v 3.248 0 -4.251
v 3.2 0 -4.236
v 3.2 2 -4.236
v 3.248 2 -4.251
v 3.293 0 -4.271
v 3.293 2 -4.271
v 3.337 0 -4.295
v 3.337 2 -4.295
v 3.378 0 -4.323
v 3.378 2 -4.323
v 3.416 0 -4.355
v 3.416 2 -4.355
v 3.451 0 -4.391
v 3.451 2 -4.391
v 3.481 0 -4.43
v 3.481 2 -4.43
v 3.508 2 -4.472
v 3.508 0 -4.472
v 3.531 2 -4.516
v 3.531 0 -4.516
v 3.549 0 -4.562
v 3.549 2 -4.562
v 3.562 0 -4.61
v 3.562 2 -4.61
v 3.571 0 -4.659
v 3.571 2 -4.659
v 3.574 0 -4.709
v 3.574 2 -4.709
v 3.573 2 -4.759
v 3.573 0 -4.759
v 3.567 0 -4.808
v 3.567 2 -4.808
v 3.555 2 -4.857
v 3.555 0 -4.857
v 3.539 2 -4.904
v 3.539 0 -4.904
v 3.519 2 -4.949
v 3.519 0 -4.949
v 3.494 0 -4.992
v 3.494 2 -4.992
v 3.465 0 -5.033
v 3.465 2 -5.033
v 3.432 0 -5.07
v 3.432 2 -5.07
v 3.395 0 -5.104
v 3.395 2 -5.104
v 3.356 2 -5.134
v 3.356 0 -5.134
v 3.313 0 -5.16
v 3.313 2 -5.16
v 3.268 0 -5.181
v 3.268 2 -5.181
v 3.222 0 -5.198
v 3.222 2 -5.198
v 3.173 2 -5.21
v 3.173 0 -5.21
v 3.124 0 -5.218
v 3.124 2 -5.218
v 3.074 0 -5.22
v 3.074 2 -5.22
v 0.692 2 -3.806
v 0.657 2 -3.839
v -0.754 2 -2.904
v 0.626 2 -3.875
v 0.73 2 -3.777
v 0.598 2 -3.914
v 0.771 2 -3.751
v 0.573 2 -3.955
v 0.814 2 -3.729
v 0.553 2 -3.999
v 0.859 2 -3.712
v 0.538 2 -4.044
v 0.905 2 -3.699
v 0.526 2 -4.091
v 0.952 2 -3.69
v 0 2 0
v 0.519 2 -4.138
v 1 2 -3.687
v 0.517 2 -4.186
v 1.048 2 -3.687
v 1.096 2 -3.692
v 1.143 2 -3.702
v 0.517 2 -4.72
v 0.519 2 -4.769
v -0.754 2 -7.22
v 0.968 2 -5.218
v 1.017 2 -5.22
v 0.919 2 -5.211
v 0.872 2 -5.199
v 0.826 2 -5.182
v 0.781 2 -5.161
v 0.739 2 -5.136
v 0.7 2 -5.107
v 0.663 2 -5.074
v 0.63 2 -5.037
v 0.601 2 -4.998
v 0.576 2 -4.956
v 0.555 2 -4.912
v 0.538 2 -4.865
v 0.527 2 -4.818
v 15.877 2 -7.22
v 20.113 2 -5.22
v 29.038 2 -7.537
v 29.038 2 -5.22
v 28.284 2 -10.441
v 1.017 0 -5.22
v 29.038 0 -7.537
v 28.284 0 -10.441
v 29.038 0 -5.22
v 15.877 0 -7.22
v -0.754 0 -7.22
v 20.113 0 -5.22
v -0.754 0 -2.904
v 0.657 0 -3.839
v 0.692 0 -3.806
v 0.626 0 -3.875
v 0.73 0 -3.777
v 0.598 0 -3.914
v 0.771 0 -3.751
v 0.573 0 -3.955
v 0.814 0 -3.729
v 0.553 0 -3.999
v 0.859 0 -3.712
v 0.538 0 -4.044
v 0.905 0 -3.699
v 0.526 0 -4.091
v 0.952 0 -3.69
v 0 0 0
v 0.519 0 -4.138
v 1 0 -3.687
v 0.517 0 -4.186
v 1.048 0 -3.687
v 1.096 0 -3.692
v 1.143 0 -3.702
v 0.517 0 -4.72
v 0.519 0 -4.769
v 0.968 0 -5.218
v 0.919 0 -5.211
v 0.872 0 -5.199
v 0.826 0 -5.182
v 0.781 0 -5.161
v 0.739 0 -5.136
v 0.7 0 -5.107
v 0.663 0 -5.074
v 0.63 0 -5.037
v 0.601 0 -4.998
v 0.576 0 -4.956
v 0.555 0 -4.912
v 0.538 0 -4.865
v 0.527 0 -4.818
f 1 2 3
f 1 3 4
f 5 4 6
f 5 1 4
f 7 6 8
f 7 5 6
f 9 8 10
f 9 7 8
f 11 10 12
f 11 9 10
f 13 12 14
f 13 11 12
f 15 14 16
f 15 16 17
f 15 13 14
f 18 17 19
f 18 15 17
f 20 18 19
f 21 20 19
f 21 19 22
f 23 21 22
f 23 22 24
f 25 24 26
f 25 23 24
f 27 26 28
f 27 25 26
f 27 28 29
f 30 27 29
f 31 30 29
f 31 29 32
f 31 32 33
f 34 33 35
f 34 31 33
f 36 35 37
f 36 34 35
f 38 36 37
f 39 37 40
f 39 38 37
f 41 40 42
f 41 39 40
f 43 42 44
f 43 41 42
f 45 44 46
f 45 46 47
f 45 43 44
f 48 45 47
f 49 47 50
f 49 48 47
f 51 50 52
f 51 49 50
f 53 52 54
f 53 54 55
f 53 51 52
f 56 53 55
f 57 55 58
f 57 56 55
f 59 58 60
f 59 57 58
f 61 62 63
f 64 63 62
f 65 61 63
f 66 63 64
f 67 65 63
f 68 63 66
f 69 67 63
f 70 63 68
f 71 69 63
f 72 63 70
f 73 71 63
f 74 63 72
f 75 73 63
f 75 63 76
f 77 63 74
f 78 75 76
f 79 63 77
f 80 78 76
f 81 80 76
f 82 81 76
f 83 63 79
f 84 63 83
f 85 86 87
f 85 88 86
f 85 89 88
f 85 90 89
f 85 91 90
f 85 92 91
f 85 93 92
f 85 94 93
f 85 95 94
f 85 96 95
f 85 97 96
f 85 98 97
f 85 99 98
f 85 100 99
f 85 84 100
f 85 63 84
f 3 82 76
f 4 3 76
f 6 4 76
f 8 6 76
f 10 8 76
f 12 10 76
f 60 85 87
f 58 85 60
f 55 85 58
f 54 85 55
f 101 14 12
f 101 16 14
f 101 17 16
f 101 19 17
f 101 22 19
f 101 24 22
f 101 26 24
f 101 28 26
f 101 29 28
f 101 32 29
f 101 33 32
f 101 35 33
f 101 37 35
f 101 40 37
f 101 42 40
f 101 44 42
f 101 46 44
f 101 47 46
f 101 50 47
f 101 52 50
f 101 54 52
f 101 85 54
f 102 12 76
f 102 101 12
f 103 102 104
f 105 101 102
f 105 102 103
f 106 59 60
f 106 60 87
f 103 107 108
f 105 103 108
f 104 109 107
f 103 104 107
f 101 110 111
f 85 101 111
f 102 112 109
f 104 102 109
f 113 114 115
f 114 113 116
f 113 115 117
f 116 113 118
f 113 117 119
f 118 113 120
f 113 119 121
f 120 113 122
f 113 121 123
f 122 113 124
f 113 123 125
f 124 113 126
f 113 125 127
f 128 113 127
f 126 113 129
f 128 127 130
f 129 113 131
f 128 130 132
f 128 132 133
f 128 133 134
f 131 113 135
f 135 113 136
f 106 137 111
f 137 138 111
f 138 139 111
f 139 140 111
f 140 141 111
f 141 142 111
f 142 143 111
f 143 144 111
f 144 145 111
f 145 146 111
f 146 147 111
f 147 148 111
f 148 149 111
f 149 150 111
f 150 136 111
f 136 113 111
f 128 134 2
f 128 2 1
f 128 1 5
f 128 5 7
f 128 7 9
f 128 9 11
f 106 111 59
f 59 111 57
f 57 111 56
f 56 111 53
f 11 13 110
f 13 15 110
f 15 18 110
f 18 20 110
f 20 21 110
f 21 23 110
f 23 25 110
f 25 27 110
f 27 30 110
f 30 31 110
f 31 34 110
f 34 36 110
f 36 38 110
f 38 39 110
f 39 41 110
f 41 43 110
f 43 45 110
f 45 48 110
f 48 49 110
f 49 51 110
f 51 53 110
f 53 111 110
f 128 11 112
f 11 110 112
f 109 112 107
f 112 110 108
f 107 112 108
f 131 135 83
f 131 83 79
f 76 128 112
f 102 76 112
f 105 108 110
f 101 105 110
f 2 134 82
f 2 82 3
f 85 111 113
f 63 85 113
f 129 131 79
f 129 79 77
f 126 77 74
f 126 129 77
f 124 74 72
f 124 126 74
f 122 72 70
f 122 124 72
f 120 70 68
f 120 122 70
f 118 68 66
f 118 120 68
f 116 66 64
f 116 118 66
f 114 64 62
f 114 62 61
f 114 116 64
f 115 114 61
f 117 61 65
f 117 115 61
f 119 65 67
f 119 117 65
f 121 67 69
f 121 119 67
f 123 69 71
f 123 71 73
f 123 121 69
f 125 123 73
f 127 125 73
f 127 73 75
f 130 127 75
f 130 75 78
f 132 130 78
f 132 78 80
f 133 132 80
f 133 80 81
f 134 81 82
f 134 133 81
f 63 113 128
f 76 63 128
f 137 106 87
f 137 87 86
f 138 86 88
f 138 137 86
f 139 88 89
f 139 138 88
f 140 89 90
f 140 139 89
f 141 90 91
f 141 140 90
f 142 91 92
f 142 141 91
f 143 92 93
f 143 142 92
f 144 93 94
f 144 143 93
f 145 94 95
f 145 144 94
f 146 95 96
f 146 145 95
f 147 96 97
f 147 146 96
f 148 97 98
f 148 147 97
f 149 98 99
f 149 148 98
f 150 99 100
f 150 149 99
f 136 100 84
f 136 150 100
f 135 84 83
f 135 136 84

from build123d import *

# Parameters (mm, degrees)
BOSS_EXTRUDE1_DEPTH = 2


with BuildPart() as part:
    # Sketch1 → Boss-Extrude1 (new body)
    with BuildSketch(Plane(origin=(0, 0, 0), x_dir=(1, 0, 0), z_dir=(0, 1, 0))):
        Polygon((0, 0), (20.112843107, 5.220264813), (29.03786322, 5.220264813), (29.03786322, 7.220264813), (29.03786322, 7.536743304), (28.284188889, 10.440529626), (15.877025026, 7.220264813), (-0.75367433, 7.220264813), (-0.75367433, 5.220264813), (-0.75367433, 2.903786322), align=None)
        with BuildLine():
            Line((0.516929559, 4.720264813), (0.516929559, 4.186250024))
            ThreePointArc((0.516929559, 4.186250024), (0.71099345, 3.79077171), (1.142541948, 3.702285637))
            Line((1.142541948, 3.702285637), (3.200015285, 4.236300426))
            ThreePointArc((3.200015285, 4.236300426), (3.570377792, 4.783580714), (3.074402897, 5.220264813))
            Line((3.074402897, 5.220264813), (1.016929559, 5.220264813))
            ThreePointArc((1.016929559, 5.220264813), (0.663376169, 5.073818204), (0.516929559, 4.720264813))
        make_face(mode=Mode.SUBTRACT)
    extrude(amount=BOSS_EXTRUDE1_DEPTH)


solid = part.part
